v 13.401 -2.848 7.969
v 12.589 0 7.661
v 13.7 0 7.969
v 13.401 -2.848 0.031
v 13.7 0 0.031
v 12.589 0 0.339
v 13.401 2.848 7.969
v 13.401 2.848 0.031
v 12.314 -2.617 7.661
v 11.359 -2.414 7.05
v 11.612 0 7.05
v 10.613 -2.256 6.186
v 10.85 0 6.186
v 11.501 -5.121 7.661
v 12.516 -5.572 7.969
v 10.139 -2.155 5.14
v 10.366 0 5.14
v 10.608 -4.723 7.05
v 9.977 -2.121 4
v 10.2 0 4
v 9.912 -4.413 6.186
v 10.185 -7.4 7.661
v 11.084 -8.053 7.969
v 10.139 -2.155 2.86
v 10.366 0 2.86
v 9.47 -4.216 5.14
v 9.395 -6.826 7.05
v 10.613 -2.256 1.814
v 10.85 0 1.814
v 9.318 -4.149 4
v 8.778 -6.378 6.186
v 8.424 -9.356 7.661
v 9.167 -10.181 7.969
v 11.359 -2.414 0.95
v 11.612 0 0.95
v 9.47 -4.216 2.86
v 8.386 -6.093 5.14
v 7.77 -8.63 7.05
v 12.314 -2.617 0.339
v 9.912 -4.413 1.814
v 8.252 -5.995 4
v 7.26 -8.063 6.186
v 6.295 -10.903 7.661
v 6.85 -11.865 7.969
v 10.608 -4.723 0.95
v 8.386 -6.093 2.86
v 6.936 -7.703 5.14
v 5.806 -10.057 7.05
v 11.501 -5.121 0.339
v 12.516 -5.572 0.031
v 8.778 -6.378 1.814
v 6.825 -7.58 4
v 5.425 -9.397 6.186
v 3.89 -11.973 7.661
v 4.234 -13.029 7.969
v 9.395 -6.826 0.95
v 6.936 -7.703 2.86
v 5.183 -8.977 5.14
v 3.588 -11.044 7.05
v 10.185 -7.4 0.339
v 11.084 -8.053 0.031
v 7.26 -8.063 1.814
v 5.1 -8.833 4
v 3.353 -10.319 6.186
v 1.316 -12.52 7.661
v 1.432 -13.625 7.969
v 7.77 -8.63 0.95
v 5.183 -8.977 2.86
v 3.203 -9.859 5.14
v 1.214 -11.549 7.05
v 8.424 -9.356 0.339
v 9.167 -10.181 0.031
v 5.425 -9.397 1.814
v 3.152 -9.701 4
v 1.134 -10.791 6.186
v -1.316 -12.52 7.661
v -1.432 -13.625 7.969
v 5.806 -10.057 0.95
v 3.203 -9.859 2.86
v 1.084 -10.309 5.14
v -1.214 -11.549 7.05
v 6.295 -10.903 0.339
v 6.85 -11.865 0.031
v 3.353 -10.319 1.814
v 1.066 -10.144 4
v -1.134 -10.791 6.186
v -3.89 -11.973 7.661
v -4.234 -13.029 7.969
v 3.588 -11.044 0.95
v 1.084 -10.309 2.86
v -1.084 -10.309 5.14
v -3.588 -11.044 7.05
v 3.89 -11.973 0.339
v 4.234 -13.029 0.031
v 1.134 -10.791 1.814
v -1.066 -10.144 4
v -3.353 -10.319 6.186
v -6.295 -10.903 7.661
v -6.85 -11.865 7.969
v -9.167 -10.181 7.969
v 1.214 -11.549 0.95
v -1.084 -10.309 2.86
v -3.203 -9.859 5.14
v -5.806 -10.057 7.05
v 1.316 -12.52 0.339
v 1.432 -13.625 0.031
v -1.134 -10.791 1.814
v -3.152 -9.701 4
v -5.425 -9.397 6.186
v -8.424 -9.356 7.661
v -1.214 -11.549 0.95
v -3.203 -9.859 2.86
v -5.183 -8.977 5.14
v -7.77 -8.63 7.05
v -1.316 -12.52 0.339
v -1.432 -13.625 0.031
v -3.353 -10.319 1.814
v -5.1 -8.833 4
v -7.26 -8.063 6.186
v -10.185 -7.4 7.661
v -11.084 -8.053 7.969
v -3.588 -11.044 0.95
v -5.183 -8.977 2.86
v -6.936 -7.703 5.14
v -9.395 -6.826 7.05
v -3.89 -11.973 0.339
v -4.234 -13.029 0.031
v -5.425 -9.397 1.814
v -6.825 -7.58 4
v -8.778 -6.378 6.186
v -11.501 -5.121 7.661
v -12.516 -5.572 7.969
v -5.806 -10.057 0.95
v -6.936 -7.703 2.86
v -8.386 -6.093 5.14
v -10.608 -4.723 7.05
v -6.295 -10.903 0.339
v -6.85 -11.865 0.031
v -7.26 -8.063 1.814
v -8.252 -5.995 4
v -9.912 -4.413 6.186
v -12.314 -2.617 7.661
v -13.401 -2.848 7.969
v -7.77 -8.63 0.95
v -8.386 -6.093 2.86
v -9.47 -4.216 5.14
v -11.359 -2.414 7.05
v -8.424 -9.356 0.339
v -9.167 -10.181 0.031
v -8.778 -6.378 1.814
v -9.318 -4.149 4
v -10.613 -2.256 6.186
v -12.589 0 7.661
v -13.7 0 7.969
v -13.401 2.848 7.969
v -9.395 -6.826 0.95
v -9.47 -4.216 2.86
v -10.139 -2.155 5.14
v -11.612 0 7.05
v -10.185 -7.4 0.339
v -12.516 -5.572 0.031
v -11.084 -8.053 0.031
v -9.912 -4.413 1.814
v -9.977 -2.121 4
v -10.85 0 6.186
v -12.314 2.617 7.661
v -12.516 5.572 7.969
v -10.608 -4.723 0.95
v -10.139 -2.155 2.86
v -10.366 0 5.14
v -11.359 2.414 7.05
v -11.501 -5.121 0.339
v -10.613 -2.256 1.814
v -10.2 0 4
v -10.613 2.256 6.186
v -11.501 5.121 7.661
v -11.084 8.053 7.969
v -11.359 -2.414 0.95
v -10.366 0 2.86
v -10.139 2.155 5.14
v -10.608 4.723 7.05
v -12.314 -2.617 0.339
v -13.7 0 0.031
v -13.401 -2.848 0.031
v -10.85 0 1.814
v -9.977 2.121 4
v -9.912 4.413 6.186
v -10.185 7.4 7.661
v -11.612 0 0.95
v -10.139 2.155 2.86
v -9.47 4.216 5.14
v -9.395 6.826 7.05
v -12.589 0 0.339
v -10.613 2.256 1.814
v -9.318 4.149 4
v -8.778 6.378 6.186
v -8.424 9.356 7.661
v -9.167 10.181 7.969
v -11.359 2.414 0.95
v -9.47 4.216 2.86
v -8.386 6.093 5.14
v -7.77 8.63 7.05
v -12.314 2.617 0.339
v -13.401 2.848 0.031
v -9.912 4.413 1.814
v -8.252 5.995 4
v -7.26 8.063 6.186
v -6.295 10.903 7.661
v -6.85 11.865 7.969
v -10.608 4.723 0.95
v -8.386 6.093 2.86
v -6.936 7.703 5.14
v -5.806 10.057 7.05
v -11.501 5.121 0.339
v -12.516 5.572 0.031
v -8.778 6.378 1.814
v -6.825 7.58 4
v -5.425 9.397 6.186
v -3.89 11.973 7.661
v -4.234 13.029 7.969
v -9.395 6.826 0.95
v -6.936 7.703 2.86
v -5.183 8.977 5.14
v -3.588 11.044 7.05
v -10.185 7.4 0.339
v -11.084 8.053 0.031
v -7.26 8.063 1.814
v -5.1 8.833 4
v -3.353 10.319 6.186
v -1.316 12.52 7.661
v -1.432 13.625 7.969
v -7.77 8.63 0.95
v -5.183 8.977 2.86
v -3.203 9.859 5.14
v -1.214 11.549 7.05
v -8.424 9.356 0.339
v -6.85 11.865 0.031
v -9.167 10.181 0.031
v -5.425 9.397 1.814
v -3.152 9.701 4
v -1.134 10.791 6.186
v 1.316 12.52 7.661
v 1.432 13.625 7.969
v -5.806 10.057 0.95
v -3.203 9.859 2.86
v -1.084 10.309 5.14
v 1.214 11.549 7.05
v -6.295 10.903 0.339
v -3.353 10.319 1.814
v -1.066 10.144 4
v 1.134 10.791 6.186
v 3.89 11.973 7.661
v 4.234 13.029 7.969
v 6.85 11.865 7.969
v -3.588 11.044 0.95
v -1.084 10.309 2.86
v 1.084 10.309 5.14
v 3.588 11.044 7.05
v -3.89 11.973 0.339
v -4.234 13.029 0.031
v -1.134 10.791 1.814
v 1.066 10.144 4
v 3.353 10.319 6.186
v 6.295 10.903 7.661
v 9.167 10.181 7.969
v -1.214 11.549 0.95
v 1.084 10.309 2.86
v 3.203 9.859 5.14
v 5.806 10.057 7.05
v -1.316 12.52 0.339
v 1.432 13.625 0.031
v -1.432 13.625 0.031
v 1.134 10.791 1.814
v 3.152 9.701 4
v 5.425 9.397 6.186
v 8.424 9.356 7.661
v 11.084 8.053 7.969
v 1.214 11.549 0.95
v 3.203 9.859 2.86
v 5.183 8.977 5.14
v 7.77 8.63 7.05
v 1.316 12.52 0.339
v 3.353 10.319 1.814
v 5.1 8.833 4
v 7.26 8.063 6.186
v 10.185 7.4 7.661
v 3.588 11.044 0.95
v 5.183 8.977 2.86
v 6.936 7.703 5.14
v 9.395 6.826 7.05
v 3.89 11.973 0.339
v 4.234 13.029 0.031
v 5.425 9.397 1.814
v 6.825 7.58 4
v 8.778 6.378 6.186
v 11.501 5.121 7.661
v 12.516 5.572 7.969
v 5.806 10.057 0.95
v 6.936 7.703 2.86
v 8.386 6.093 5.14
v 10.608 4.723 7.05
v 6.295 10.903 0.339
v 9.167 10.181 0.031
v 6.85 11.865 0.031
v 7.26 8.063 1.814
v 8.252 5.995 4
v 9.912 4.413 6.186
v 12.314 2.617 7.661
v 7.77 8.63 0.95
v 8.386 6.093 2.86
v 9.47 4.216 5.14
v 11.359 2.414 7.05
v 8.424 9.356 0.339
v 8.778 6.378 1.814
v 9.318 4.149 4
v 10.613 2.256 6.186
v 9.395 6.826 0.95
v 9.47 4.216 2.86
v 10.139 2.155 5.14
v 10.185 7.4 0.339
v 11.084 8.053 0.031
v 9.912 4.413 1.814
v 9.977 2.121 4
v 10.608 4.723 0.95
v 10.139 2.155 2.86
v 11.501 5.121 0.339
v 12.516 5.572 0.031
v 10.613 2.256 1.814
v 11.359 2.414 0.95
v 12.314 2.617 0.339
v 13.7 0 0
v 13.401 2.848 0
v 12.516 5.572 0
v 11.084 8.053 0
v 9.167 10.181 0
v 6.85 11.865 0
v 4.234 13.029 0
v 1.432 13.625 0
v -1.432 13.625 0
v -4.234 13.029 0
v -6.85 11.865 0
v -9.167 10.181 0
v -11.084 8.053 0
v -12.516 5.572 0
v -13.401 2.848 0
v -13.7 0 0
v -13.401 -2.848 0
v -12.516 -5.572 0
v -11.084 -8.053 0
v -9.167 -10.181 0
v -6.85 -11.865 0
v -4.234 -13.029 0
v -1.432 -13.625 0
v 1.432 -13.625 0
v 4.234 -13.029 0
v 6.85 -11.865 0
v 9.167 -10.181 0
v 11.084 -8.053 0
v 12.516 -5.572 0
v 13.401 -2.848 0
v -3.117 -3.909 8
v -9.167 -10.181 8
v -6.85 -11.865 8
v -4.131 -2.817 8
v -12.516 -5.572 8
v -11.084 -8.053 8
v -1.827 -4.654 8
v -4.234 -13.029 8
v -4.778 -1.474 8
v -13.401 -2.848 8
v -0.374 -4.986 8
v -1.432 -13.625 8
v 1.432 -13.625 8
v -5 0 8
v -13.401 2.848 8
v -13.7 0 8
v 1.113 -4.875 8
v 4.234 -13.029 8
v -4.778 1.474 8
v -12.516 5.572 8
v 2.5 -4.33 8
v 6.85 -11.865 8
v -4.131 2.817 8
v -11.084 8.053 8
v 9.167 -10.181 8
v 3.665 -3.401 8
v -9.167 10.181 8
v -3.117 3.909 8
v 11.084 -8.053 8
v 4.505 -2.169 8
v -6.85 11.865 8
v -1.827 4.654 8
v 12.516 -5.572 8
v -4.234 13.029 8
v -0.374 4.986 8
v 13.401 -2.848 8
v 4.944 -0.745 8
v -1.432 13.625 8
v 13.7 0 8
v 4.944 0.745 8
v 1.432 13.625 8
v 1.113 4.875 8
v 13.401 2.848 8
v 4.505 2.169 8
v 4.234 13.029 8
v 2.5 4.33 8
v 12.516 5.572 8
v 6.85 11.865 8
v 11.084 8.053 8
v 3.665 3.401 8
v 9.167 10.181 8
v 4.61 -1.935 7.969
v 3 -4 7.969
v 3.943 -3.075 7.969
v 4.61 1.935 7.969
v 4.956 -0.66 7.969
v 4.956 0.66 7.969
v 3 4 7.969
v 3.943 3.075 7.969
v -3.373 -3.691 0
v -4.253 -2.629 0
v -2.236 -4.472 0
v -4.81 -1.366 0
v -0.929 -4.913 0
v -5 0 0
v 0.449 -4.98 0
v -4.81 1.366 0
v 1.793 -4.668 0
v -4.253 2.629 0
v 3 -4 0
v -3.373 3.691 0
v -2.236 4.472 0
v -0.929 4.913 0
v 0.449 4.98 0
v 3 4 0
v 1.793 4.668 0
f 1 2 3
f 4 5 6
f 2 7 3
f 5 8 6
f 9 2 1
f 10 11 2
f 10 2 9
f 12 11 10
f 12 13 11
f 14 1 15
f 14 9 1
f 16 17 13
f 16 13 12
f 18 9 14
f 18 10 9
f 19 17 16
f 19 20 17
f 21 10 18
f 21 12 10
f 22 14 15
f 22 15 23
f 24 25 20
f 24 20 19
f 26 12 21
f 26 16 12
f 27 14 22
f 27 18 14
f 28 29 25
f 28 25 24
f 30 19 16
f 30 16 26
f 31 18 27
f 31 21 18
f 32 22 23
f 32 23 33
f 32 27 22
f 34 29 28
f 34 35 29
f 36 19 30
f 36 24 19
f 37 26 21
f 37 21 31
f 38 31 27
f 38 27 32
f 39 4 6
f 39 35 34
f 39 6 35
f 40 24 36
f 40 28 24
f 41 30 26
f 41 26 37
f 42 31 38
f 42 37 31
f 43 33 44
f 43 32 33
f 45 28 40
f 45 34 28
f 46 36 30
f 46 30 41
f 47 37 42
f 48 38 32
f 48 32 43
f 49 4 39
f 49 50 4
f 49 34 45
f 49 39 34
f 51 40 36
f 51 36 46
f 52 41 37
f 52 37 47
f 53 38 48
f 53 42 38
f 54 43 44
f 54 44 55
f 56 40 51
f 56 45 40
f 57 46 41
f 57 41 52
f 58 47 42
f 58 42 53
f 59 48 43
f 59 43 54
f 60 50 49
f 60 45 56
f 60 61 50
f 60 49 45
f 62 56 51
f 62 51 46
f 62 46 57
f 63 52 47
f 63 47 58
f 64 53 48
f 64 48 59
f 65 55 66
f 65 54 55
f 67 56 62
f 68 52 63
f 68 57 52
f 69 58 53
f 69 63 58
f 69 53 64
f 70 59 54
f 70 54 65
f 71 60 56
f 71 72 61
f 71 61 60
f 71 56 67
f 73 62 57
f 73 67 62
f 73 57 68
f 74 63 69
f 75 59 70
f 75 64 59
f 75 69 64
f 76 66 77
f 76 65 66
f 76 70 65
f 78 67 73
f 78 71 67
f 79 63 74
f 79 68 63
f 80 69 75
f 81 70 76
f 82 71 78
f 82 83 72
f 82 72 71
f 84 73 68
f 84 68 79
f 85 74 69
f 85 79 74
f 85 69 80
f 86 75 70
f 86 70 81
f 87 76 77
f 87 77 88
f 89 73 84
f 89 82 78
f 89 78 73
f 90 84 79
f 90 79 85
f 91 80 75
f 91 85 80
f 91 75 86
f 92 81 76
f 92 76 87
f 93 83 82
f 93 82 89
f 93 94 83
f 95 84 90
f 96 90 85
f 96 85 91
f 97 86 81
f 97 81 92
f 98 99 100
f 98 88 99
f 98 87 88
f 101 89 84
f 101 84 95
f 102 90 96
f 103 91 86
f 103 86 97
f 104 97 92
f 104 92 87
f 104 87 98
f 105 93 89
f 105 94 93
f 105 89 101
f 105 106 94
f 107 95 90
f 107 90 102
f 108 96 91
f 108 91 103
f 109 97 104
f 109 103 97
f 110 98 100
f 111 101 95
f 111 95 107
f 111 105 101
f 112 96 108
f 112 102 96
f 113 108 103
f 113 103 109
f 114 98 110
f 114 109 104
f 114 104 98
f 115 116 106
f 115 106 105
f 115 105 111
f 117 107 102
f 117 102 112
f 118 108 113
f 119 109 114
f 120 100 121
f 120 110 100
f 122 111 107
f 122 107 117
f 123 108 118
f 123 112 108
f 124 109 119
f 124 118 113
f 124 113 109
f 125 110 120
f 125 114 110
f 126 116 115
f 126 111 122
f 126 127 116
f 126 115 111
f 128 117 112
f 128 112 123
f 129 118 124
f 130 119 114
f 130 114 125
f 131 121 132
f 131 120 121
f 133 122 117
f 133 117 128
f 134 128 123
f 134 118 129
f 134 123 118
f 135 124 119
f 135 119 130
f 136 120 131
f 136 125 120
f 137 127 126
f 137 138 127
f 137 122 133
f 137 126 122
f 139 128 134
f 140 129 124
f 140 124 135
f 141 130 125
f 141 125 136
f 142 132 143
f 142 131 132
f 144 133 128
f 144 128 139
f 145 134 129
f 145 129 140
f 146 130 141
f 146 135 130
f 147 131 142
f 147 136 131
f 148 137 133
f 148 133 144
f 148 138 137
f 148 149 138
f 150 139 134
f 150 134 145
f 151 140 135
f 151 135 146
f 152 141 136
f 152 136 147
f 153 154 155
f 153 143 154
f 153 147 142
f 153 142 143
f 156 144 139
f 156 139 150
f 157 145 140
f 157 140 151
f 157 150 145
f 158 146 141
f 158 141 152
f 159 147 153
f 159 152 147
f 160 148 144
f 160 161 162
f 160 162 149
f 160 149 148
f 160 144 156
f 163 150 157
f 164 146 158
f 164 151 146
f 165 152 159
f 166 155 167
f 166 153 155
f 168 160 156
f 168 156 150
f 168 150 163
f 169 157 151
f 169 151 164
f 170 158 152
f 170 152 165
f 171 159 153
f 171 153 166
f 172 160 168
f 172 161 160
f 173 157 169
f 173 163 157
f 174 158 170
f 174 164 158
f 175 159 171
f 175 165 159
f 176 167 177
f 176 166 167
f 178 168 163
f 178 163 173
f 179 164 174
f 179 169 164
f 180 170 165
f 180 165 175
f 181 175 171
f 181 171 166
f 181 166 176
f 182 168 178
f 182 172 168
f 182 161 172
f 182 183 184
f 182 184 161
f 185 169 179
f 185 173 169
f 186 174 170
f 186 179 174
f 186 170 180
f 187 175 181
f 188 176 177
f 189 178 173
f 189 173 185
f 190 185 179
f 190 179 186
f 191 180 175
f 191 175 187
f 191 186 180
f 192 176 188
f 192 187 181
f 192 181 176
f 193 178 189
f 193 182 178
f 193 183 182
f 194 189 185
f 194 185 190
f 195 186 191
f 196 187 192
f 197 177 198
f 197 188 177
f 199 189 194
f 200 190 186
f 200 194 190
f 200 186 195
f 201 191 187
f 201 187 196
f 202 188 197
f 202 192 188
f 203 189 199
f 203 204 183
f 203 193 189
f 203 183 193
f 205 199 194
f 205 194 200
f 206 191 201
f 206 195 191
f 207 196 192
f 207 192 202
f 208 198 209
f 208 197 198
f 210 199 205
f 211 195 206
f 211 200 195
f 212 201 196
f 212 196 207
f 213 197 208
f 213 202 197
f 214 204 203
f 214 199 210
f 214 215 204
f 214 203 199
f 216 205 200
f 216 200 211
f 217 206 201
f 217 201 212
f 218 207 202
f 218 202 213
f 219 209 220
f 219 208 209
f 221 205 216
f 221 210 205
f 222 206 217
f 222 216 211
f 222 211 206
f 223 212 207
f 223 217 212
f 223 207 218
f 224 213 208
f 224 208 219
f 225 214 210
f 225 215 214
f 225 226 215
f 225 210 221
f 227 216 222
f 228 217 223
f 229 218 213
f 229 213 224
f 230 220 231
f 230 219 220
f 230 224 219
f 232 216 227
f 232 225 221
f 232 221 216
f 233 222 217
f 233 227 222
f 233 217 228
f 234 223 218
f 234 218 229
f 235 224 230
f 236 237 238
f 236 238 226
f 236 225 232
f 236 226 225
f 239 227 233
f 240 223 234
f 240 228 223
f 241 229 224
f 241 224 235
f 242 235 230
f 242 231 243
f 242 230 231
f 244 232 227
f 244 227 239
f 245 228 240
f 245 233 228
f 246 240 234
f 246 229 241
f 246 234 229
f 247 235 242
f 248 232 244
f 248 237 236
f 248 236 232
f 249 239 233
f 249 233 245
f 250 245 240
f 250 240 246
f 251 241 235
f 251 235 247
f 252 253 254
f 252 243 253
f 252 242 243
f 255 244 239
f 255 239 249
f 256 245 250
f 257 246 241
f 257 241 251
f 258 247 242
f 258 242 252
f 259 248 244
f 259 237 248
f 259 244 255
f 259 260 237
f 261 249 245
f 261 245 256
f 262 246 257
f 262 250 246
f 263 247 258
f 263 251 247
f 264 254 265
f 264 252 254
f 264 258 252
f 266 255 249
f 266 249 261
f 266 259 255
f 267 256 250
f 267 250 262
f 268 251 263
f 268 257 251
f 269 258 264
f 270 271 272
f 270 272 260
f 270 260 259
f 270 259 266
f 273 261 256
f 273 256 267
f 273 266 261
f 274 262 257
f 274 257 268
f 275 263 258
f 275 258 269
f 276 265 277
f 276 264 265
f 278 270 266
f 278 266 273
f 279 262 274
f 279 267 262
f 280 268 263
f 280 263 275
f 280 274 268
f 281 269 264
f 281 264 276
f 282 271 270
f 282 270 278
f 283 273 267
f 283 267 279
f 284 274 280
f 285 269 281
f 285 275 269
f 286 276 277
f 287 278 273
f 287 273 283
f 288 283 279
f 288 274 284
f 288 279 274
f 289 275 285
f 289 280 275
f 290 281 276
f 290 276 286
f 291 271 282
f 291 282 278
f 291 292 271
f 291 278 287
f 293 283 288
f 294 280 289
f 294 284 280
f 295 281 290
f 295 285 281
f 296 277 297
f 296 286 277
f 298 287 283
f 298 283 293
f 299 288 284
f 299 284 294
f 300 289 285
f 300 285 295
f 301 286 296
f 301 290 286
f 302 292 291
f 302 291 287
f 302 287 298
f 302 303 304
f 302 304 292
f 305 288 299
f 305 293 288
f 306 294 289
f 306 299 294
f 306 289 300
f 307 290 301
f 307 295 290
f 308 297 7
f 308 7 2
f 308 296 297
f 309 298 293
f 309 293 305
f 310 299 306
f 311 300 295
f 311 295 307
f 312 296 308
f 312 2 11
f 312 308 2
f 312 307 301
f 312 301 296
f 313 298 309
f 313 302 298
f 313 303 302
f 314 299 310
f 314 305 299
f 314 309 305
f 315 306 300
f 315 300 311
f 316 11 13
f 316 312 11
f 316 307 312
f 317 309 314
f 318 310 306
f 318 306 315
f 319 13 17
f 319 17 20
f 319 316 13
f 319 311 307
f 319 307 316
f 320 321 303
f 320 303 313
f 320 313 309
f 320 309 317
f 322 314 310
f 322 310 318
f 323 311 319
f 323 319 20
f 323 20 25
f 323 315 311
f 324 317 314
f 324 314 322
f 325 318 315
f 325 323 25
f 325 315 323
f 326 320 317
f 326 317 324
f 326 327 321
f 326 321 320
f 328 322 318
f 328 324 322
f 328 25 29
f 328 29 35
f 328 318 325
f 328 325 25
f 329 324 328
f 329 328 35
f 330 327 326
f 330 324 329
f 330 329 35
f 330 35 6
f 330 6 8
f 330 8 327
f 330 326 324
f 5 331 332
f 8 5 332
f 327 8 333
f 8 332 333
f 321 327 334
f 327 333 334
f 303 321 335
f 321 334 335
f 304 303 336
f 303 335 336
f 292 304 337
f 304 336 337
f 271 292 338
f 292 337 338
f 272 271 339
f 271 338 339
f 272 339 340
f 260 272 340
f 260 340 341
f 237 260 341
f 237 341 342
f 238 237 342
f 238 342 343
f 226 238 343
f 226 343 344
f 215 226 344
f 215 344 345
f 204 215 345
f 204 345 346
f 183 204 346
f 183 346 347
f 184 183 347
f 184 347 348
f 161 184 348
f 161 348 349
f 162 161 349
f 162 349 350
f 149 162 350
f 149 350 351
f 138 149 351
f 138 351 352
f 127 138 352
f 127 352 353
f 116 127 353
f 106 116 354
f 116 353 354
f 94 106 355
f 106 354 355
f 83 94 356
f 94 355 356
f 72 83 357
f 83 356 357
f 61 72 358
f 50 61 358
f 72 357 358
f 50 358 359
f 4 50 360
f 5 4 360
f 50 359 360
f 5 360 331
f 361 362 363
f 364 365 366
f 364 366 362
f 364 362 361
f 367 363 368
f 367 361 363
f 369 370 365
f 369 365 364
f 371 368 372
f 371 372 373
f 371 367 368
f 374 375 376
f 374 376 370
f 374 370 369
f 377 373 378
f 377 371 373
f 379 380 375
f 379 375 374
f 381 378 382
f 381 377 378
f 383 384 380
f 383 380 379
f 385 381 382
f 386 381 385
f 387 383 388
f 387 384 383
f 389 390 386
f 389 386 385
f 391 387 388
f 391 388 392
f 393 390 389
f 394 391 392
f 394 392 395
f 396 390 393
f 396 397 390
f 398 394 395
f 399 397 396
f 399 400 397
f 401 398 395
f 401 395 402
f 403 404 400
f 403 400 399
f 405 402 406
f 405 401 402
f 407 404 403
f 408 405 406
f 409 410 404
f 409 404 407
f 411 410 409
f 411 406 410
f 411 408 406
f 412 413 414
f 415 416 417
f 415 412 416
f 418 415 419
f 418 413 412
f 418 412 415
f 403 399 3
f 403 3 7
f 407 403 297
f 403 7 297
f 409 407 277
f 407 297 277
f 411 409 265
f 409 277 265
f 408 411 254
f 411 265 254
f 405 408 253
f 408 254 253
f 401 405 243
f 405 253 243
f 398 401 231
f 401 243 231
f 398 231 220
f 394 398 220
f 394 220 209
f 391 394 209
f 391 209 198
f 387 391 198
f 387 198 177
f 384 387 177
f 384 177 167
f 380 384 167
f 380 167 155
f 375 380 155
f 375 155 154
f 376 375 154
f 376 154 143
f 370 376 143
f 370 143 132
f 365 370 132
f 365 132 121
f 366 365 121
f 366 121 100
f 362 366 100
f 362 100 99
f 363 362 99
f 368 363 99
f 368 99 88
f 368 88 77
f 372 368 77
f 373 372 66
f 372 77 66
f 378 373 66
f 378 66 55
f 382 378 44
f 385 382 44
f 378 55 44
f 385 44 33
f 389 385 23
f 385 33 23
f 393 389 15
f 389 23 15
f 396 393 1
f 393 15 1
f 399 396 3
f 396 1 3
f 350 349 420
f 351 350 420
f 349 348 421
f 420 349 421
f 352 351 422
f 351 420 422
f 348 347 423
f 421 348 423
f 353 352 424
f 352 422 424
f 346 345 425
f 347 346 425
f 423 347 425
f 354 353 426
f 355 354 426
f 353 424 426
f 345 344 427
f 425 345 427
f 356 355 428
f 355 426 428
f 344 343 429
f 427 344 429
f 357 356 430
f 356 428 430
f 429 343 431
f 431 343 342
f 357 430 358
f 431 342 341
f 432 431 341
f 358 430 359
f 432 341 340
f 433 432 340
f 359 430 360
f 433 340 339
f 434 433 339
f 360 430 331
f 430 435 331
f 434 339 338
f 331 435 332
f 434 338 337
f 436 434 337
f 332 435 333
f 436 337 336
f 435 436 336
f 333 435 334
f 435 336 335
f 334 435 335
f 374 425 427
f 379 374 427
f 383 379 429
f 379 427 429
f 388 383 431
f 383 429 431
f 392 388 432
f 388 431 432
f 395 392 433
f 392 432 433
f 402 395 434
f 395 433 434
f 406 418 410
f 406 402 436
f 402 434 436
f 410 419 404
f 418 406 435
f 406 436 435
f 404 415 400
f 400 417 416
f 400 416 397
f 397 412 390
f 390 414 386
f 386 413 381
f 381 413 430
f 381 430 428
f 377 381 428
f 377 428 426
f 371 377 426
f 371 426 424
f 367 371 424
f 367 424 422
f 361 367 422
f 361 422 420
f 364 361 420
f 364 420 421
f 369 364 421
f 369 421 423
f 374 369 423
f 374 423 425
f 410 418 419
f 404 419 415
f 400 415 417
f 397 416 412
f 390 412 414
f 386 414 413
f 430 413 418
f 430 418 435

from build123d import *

# Parameters (mm, degrees)
SKETCH_1_R          = 13.7
EXTRUDE_1_DEPTH     = 8
SKETCH_4_R          = 5
CUT_EXTRUDE_1_DEPTH = 21.961393083
EXTRUDE_2_REACH     = 25.034
SKETCH_5_W          = 7.968626967
SKETCH_5_H          = 13.552288672


with BuildPart() as part:
    # 스케치1 → 보스-돌출1 (new body)
    with BuildSketch(Plane.XY):
        Circle(SKETCH_1_R)
    extrude(amount=EXTRUDE_1_DEPTH)

    # 스케치2 → 컷-회전1 (revolve, cut)
    with BuildSketch(Plane(origin=(0, 0, 0), x_dir=(1, 0, 0), z_dir=(0, 1, 0)), mode=Mode.PRIVATE) as cut_revolve_1_sk:
        with BuildLine():
            Line((-14.7, 0), (-14.7, -8))
            Line((-14.7, -8), (-14.2, -8))
            ThreePointArc((-14.2, -8), (-10.2, -4), (-14.2, 0))
            Line((-14.2, 0), (-14.7, 0))
        make_face()
    revolve(cut_revolve_1_sk.sketch.rotate(Axis((0, 0, 12.586575048), (0, 0, -1)), 180), axis=Axis((0, 0, 12.586575048), (0, 0, -1)), mode=Mode.SUBTRACT)

    # 스케치4 → 컷-돌출1 (cut, through all)
    with BuildSketch(Plane(origin=(0, 0, 0), x_dir=(-1, 0, 0), z_dir=(0, 0, -1))):
        Circle(SKETCH_4_R)
    extrude(amount=-CUT_EXTRUDE_1_DEPTH, mode=Mode.SUBTRACT)

    # 스케치5 → 보스-돌출2 (add, up to next)
    with BuildSketch(Plane(origin=(3, 0, 0), x_dir=(0, 0, -1), z_dir=(1, 0, 0)), mode=Mode.PRIVATE) as extrude_2_sk1:
        with Locations((-3.984313484, -0.077510512)):
            Rectangle(SKETCH_5_W, SKETCH_5_H)
    extrude_2_tool1 = extrude(extrude_2_sk1.sketch, amount=EXTRUDE_2_REACH, mode=Mode.PRIVATE) - part.part
    add(extrude_2_tool1.solids().sort_by_distance((3, -0.077511, 3.984313))[0])


solid = part.part
